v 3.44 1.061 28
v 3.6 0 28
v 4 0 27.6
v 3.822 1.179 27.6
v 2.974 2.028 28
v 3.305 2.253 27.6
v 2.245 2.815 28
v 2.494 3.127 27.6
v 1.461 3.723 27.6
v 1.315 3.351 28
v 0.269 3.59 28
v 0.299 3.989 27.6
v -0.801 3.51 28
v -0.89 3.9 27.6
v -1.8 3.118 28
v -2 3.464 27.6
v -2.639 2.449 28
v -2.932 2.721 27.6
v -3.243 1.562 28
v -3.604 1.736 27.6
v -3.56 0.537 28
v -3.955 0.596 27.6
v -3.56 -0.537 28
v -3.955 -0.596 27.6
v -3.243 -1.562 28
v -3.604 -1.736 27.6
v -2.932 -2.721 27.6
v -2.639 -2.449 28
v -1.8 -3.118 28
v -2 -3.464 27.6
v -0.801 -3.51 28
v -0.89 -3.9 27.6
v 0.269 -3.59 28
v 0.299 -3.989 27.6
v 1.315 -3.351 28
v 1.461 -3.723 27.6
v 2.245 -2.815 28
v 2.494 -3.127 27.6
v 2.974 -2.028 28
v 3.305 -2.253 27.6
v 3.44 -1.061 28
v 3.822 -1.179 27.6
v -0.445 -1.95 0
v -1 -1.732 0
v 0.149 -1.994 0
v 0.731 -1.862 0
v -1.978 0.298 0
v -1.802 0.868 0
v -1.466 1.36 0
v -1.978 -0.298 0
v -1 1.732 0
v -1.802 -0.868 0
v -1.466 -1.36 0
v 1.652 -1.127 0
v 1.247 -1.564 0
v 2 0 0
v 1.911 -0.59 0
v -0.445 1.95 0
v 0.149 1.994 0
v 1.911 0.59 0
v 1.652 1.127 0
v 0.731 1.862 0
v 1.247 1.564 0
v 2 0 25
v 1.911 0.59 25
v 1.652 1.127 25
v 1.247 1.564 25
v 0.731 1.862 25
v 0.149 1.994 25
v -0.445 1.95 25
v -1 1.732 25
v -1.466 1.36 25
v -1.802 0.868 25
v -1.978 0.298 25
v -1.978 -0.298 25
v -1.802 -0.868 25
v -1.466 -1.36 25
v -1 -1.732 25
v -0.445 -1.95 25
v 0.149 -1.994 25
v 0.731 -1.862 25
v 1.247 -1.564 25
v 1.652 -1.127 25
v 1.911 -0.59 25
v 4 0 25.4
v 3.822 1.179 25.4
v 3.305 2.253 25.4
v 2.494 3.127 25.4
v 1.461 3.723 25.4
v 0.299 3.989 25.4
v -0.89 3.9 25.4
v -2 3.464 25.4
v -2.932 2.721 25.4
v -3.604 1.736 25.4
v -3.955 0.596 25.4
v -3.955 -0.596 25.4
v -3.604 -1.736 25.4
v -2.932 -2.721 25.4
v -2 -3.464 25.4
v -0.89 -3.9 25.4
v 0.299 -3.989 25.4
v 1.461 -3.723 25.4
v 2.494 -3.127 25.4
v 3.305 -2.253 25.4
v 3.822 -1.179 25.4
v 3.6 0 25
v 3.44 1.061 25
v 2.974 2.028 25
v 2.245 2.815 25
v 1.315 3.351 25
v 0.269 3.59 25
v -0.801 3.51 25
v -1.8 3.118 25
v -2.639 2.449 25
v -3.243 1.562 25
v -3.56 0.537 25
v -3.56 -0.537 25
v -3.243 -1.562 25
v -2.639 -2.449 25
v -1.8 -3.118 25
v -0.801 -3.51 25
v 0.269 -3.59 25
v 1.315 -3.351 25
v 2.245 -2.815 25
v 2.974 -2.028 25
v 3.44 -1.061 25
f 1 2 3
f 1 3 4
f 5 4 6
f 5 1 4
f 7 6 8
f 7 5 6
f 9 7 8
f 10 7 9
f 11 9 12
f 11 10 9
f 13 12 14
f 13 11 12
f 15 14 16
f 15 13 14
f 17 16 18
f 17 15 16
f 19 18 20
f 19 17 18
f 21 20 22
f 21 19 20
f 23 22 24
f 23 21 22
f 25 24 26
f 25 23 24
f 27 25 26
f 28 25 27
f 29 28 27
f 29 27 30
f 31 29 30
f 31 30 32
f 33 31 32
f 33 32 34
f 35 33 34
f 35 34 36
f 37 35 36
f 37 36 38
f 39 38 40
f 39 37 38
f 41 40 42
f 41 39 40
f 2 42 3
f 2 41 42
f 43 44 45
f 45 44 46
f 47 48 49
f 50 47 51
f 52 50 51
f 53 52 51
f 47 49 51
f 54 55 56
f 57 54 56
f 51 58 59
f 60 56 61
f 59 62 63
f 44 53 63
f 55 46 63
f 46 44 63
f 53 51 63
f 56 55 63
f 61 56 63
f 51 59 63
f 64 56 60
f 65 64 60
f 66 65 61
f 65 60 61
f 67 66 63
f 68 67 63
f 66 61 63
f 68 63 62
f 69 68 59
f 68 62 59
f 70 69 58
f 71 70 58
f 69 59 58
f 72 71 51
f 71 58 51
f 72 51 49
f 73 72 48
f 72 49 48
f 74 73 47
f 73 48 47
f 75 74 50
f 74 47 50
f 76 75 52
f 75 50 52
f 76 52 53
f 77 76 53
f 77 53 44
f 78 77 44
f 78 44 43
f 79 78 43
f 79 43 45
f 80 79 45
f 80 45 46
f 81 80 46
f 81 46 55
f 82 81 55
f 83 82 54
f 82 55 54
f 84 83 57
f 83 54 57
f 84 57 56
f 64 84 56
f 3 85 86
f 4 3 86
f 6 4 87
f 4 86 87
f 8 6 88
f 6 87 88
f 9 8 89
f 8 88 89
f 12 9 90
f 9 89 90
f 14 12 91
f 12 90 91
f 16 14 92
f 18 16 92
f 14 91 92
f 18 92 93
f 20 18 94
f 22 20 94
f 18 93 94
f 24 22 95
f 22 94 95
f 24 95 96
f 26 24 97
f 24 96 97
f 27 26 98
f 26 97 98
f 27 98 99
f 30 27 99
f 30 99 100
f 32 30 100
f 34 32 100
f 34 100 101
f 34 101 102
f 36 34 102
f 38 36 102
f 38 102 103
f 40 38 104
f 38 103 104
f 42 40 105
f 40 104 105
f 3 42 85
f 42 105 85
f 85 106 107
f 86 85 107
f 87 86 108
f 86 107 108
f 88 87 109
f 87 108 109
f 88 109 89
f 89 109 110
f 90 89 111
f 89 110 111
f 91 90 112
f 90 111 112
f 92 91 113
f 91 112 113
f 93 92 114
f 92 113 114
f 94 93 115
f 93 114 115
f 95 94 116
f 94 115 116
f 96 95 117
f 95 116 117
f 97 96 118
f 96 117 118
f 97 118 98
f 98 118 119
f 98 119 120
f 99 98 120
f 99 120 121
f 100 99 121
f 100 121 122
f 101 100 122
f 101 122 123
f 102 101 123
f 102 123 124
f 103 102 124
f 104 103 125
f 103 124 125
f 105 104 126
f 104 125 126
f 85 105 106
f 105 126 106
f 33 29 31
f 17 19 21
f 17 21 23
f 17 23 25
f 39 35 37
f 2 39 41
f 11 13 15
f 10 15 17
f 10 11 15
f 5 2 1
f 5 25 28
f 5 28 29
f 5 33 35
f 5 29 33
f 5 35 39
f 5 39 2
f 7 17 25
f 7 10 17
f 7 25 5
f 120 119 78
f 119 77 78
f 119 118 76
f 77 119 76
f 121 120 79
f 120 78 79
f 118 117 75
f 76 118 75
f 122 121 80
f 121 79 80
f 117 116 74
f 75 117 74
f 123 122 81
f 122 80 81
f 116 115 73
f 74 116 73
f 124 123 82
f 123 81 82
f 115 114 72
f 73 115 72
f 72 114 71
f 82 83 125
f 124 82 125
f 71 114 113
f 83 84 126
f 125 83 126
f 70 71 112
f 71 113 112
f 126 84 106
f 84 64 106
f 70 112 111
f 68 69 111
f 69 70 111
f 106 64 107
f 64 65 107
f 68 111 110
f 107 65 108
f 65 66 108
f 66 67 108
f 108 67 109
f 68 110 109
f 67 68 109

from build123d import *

# Parameters (mm, degrees)
F0_R     = 2
F1_DEPTH = 25
F2_R     = 4
F2_R_2   = 2
F3_DEPTH = 3
F4_SIZE  = 0.4


with BuildPart() as f1:
    # F0 (on Top) → F1 (new body)
    with BuildSketch(Plane.XY):
        Circle(F0_R)
    extrude(amount=F1_DEPTH)

    # F2 (on face) → F3 (join)
    with BuildSketch(Plane.XY.offset(25)):
        Circle(F2_R)
        Circle(F2_R_2, mode=Mode.SUBTRACT)
        Circle(F2_R_2)
    extrude(amount=F3_DEPTH)

    # F4
    f4_edges = [f1.edges().sort_by_distance(p)[0] for p in [
        (-4, 0, 28),
        (-4, 0, 25),
    ]]
    chamfer(f4_edges, length=F4_SIZE)


solid = f1.part
